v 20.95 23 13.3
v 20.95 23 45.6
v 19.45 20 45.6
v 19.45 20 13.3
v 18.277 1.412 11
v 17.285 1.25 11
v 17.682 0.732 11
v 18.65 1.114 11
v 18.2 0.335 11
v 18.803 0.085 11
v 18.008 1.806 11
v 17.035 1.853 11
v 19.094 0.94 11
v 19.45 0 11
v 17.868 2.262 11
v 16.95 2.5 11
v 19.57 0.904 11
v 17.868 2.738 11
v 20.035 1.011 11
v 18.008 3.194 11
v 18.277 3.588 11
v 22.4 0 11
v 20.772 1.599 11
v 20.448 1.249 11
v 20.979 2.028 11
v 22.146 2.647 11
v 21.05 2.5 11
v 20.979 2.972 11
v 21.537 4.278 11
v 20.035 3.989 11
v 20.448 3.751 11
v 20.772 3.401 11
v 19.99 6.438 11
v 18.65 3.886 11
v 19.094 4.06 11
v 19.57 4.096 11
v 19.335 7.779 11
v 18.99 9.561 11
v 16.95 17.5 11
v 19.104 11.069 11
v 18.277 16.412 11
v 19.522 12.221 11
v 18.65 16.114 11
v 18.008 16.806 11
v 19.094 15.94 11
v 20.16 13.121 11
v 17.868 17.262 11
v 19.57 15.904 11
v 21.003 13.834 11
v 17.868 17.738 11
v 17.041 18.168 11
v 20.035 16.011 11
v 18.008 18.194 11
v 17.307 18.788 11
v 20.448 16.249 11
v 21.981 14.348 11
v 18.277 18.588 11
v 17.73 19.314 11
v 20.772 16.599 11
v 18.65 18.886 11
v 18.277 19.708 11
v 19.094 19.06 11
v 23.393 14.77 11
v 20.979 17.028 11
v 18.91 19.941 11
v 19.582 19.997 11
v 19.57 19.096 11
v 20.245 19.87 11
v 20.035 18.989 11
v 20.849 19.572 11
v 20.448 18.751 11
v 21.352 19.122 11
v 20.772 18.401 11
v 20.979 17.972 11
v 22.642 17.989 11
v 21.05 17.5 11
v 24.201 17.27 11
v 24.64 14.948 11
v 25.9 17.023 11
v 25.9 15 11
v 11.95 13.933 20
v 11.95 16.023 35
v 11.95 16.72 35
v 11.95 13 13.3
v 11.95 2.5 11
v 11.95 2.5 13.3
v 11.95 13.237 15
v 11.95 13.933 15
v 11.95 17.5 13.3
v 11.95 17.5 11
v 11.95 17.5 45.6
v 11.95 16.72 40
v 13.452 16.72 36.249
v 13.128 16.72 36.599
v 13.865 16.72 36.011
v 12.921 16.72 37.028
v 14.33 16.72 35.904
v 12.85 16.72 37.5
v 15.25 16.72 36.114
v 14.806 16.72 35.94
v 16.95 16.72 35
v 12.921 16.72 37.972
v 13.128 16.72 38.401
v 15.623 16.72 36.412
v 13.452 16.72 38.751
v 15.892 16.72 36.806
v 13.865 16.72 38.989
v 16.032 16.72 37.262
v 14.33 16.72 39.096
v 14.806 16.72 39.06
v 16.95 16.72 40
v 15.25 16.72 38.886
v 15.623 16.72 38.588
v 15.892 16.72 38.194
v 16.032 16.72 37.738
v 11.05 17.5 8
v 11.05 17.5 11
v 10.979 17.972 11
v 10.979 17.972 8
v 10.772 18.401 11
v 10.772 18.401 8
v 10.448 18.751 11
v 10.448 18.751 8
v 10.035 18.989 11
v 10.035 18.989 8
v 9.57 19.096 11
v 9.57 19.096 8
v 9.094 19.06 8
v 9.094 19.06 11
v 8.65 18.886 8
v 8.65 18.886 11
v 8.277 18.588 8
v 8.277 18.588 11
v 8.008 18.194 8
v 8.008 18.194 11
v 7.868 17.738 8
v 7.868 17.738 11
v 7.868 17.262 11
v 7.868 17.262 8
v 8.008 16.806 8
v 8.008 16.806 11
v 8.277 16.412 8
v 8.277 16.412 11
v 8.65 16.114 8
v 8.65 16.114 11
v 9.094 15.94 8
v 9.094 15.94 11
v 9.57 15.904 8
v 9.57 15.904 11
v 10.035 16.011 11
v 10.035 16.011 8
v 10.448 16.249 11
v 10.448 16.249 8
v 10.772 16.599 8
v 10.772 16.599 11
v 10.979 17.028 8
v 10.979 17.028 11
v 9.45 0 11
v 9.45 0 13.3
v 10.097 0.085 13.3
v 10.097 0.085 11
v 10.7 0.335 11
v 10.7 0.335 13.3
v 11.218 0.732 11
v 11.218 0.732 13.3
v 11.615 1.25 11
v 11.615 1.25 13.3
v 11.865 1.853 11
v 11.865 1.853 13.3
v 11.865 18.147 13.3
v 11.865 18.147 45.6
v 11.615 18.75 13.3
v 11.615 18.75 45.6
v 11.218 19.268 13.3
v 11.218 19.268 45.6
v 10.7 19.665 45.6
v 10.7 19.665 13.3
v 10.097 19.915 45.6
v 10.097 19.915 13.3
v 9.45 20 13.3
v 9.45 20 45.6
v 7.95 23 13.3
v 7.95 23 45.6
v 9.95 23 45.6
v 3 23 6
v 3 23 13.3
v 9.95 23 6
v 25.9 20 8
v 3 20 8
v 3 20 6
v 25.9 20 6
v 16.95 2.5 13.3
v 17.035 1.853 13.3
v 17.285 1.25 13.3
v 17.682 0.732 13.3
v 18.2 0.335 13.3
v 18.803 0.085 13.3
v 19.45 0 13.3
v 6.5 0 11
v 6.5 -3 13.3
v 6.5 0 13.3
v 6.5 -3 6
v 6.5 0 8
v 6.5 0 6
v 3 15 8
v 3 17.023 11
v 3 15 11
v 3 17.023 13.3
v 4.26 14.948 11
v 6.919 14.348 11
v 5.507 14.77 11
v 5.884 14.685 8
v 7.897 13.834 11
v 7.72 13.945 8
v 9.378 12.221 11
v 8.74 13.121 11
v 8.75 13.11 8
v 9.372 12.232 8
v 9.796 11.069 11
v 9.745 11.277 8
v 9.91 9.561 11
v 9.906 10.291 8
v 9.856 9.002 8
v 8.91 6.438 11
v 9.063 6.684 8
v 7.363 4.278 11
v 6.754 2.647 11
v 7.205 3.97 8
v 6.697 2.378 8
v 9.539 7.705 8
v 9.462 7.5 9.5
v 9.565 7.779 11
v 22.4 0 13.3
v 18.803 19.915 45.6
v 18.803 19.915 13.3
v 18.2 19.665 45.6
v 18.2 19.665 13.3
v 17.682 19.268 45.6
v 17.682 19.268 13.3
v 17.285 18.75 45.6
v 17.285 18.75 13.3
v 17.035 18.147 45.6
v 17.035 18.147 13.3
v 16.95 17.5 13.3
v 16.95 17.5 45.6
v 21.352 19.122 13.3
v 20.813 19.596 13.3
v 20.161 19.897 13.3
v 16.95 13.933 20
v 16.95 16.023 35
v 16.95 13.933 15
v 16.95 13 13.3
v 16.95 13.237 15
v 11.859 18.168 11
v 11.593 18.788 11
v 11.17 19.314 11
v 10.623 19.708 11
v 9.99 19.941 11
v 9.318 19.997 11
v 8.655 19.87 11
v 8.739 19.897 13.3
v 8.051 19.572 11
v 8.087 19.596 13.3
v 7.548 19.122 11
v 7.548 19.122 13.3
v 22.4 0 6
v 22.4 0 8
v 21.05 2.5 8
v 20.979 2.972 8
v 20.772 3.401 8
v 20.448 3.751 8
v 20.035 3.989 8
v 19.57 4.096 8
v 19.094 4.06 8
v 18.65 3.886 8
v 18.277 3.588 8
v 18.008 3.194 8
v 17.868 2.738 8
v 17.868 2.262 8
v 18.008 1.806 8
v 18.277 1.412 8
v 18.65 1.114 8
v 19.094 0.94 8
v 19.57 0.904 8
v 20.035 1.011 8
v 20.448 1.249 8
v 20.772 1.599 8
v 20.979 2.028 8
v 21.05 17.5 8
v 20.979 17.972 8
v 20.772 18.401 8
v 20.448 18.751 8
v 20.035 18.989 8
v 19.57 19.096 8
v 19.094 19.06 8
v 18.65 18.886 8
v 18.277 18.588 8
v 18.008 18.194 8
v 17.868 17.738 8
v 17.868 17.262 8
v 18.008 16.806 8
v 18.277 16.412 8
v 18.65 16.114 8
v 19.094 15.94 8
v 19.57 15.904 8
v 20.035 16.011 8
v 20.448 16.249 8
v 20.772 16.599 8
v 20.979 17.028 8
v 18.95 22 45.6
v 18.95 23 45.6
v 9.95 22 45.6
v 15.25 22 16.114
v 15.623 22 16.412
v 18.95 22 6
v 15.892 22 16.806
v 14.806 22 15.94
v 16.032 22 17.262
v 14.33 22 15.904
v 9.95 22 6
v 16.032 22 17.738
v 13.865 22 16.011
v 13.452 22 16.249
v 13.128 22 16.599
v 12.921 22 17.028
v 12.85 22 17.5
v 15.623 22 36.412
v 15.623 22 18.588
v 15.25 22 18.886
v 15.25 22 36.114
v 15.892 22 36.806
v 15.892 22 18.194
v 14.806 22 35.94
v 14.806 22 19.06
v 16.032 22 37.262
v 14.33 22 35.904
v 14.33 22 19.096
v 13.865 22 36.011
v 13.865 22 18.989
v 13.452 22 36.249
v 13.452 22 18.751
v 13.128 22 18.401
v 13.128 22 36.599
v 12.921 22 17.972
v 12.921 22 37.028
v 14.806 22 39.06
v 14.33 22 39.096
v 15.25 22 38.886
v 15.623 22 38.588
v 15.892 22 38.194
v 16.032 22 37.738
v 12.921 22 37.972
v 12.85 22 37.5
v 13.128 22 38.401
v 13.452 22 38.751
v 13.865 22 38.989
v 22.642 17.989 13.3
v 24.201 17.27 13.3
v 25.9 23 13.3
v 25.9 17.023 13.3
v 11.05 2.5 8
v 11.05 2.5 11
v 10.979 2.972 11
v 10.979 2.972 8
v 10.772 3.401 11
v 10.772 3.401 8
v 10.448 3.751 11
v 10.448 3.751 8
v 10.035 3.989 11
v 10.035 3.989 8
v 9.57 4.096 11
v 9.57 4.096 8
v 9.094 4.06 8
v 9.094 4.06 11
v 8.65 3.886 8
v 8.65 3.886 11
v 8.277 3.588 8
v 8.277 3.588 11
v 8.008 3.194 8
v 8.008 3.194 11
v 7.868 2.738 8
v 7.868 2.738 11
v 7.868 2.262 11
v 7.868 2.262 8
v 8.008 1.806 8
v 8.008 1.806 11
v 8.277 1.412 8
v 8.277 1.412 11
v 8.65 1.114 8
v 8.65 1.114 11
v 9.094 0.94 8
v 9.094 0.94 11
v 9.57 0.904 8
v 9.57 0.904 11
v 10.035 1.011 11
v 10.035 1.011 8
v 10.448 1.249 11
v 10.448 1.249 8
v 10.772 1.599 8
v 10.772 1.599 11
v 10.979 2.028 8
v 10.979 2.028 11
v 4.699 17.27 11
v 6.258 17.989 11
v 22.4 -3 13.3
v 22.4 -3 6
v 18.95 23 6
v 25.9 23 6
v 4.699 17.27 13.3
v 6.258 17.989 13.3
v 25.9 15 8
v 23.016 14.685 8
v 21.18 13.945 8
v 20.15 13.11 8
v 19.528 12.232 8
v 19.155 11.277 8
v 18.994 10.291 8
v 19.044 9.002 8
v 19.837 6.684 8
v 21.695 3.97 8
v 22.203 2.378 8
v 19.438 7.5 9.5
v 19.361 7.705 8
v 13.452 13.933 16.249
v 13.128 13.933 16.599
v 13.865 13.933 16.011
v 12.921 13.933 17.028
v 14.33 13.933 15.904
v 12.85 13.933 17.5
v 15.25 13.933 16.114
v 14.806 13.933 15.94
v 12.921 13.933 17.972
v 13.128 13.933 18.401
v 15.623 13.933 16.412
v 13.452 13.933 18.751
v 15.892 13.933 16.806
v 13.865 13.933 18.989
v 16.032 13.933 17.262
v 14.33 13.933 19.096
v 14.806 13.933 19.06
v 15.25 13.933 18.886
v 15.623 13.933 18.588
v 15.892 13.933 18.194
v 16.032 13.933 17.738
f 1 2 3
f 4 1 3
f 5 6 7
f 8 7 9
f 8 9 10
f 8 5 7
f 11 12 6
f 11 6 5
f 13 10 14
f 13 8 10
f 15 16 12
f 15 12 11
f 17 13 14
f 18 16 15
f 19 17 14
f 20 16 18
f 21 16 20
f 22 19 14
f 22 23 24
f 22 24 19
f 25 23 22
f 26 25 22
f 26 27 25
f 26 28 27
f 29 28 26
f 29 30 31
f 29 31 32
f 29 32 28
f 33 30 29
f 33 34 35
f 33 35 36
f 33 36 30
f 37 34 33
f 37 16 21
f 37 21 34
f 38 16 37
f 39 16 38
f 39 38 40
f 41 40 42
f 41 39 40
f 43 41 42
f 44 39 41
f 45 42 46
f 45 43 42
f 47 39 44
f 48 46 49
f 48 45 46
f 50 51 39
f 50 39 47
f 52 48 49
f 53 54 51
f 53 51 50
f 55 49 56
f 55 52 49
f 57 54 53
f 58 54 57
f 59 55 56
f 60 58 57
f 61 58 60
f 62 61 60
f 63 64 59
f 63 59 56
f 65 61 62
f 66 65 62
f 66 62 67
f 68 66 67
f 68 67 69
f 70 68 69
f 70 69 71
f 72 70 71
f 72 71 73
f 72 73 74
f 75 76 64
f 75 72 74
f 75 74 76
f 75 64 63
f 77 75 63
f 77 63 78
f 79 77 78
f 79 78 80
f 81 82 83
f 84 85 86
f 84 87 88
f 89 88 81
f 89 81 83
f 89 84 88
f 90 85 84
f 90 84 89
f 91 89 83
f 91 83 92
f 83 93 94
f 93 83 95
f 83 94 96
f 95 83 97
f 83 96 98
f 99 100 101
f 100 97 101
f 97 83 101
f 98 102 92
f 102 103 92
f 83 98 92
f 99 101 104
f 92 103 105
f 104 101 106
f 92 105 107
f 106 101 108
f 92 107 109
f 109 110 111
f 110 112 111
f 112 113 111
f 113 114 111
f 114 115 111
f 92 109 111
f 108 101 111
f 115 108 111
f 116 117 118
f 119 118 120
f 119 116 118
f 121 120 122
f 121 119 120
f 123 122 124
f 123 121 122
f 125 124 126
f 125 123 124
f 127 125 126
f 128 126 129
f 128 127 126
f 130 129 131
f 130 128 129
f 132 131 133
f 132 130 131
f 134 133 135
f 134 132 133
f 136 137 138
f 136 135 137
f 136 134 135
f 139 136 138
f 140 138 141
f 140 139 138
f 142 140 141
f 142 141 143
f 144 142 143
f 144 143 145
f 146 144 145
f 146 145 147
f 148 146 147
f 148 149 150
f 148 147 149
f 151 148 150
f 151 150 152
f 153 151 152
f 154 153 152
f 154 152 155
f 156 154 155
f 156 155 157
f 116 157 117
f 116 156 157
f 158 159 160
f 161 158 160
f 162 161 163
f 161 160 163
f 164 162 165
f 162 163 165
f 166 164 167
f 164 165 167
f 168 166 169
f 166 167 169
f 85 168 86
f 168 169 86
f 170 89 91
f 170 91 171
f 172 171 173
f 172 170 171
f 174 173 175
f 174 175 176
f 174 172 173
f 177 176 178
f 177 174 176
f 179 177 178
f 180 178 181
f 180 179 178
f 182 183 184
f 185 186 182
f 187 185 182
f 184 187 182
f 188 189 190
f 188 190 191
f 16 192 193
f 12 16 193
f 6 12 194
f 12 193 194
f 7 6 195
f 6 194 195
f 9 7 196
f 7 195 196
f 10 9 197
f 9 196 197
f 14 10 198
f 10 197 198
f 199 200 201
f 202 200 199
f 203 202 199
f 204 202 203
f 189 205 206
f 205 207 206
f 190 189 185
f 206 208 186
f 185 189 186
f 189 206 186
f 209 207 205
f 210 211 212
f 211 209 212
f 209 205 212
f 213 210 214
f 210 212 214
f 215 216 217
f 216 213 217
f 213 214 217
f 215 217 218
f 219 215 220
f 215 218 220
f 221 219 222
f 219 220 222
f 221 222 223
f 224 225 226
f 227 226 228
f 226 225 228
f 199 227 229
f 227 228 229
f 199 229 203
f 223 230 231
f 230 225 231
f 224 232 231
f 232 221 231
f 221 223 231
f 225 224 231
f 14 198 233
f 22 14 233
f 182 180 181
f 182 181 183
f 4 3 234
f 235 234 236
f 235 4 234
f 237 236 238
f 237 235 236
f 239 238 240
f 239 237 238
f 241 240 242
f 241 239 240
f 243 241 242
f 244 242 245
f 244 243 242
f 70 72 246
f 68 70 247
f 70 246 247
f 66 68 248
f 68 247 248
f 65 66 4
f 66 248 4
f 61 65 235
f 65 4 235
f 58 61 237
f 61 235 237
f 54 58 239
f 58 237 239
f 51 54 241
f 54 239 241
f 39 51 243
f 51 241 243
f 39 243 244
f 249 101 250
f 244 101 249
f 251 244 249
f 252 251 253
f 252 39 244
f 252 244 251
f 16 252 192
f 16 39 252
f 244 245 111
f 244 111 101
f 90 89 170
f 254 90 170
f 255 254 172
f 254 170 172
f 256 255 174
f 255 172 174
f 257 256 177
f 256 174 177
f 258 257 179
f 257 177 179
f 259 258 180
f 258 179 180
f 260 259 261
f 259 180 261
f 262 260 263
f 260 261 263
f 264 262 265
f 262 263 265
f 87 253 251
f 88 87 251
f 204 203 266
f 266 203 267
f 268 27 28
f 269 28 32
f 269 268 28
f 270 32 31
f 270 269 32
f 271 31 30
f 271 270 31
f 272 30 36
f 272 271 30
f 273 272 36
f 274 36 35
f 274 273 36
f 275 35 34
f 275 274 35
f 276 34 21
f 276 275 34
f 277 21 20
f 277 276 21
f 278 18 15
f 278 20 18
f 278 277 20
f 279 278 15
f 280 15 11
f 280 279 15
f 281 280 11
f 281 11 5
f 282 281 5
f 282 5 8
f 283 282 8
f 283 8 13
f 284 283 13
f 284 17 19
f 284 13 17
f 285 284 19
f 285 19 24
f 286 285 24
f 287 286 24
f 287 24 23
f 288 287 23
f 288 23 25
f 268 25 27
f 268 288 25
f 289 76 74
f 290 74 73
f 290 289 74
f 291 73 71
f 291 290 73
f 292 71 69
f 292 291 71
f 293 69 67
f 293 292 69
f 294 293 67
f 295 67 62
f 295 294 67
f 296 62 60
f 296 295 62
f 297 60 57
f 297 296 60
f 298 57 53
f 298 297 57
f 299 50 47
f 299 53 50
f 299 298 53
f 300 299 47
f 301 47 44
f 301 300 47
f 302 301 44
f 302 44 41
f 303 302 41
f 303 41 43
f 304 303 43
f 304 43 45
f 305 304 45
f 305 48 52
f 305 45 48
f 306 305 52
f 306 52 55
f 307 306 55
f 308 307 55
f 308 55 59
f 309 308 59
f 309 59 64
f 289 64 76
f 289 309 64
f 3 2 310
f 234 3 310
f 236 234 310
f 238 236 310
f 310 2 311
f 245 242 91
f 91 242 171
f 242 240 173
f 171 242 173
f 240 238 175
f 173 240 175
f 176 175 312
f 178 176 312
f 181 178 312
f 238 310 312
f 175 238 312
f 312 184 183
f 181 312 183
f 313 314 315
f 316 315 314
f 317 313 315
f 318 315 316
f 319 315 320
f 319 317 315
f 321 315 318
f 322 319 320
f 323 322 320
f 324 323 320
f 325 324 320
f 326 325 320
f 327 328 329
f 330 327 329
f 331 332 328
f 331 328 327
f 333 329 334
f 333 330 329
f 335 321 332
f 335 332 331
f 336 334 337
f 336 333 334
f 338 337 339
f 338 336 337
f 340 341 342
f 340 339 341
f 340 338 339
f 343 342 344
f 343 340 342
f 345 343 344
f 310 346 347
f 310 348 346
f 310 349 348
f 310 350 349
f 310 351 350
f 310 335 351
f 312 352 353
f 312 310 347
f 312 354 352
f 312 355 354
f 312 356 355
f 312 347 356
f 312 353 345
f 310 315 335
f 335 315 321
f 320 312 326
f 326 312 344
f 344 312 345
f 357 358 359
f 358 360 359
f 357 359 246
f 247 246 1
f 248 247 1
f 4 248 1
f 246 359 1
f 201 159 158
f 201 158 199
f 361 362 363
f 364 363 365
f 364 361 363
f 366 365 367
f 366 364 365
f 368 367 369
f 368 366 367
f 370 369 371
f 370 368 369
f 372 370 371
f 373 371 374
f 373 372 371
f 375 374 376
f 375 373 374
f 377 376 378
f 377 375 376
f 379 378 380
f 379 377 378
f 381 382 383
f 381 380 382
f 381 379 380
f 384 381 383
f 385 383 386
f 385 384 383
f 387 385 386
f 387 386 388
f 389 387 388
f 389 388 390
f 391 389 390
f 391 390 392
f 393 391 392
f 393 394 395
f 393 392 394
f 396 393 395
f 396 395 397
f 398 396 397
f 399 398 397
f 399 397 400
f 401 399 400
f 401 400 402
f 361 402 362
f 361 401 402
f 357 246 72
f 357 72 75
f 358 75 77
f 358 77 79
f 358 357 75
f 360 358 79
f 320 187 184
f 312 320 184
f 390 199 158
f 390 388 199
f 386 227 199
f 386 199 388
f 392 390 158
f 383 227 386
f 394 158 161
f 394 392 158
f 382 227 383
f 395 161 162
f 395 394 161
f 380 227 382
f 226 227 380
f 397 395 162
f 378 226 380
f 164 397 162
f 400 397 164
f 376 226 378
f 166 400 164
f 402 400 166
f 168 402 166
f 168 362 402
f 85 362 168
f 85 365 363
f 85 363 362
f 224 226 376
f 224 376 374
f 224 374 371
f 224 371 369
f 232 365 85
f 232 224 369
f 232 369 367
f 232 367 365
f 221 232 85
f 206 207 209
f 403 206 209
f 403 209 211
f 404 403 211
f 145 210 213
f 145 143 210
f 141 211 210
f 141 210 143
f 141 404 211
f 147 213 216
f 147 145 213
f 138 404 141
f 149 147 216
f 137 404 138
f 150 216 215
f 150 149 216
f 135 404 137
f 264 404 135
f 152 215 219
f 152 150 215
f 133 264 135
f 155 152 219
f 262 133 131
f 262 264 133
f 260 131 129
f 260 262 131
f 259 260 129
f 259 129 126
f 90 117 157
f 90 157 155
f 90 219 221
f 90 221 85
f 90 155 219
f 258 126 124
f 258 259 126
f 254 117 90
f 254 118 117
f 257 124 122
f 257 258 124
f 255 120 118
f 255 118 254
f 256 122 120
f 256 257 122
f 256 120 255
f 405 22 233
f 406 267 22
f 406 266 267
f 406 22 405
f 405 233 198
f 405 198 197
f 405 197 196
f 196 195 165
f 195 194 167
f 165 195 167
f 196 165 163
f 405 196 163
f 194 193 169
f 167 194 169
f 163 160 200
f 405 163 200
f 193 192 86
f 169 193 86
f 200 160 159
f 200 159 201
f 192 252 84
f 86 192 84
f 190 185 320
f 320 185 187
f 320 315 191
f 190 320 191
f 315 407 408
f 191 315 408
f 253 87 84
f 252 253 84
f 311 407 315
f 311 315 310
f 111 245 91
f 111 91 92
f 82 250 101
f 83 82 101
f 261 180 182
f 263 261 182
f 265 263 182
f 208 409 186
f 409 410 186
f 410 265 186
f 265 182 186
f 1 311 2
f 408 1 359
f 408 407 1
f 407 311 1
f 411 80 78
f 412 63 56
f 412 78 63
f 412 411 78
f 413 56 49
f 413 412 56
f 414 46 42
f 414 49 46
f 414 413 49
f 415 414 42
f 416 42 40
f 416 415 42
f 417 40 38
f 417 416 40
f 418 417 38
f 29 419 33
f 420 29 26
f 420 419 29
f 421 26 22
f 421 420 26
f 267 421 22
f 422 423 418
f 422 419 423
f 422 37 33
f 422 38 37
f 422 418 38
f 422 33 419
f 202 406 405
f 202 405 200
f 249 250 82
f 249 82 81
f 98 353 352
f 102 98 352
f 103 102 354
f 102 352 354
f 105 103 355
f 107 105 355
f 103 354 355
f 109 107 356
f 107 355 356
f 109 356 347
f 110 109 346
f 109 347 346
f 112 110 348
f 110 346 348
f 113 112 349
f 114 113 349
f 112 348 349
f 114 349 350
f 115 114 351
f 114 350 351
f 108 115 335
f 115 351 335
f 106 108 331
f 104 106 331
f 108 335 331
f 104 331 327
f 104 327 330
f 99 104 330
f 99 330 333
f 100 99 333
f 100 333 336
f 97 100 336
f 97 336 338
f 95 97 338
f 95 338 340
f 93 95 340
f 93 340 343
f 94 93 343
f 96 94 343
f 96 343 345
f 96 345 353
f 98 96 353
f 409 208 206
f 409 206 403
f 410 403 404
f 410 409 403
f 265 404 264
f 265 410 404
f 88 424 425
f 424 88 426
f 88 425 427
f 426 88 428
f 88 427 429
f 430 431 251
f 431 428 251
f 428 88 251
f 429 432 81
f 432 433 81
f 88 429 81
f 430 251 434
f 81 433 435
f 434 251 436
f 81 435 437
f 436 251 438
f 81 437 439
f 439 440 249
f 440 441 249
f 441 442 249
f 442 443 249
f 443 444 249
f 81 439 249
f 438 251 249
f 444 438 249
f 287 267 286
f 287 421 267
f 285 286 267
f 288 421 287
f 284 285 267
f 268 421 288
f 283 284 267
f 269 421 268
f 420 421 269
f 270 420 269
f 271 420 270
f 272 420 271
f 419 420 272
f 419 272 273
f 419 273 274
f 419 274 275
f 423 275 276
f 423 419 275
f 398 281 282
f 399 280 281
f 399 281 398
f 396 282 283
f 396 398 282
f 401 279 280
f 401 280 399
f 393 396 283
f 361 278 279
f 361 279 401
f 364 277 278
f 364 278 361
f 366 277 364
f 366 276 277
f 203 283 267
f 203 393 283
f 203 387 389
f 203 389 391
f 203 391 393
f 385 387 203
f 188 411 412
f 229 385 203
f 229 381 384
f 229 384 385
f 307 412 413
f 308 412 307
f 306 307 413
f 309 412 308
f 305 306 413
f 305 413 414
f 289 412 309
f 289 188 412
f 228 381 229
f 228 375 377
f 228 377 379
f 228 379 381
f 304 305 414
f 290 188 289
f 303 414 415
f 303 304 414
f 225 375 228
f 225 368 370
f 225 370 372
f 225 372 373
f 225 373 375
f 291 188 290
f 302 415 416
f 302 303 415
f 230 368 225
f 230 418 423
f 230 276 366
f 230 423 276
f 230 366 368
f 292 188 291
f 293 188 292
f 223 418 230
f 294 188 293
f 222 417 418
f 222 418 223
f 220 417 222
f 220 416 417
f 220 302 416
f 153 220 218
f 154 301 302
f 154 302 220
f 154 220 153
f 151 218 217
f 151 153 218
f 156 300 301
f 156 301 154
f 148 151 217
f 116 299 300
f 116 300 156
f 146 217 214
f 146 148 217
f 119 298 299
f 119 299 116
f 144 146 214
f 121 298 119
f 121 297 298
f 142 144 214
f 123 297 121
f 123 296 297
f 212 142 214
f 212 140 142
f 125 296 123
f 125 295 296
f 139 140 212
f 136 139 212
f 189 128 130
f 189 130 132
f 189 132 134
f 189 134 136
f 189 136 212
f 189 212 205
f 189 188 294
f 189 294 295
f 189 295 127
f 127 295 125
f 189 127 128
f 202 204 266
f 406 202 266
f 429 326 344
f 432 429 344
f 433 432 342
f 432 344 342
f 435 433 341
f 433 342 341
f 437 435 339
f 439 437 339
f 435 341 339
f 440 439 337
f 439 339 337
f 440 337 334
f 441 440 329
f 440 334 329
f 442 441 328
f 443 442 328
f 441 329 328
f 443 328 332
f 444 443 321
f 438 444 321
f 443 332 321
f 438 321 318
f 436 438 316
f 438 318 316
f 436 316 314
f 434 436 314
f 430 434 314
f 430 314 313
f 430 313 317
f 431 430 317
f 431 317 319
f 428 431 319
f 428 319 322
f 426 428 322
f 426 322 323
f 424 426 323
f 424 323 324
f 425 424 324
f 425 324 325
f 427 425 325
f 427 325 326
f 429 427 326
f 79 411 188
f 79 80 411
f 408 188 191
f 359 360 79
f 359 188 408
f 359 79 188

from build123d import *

# Parameters (mm, degrees)
SKETCH_R        = 1.6
PAD_DEPTH       = 5.3
SKETCH001_W     = 22.9
SKETCH001_H     = 3
SKETCH001_W_2   = 15.9
PAD001_DEPTH    = 2
POCKET_DEPTH    = 2.3
PAD002_DEPTH    = 32.3
POCKET001_DEPTH = 10
SKETCH007_W     = 9
SKETCH007_H     = 39.6
POCKET002_DEPTH = 1
SKETCH008_R     = 1.6
POCKET003_DEPTH = 10
SKETCH009_W     = 0.696594
SKETCH009_H     = 5
SKETCH009_W_2   = 0.696595
POCKET004_DEPTH = 5


with BuildPart() as part:
    # Sketch (on Face1 of ReferenceBinder) → Pad (new body)
    with BuildSketch(Plane.XY.offset(8)):
        with BuildLine():
            Line((3, 23), (25.9, 23))
            Line((25.9, 23), (25.9, 15))
            add(Edge.make_bspline(
                [(25.9, 15), (18.45, 15), (18.45, 5), (22.4, 5), (22.4, 0)],
                knots=[0, 0, 0, 0, 0.5, 1, 1, 1, 1], degree=3))
            Line((22.4, 0), (22.4, -3))
            Line((22.4, -3), (6.5, -3))
            Line((6.5, -3), (6.5, 0))
            add(Edge.make_bspline(
                [(3, 15), (10.45, 15), (10.45, 5), (6.5, 5), (6.5, 0)],
                knots=[0, 0, 0, 0, 0.5, 1, 1, 1, 1], degree=3))
            Line((3, 15), (3, 23))
        make_face()
        with Locations((9.45, 17.5)):
            Circle(SKETCH_R, mode=Mode.SUBTRACT)
        with Locations((19.45, 17.5)):
            Circle(SKETCH_R, mode=Mode.SUBTRACT)
        with Locations((19.45, 2.5)):
            Circle(SKETCH_R, mode=Mode.SUBTRACT)
        with Locations((9.45, 2.5)):
            Circle(SKETCH_R, mode=Mode.SUBTRACT)
    extrude(amount=PAD_DEPTH)

    # Sketch001 (on Face1 of ReferenceBinder) → Pad001 (join)
    with BuildSketch(Plane.XY.offset(8)):
        with Locations((14.45, 21.5)):
            Rectangle(SKETCH001_W, SKETCH001_H)
        with Locations((14.45, -1.5)):
            Rectangle(SKETCH001_W_2, SKETCH001_H)
    extrude(amount=-PAD001_DEPTH)

    # Sketch002 (on Face5 of Pad001) → Pocket (cut)
    with BuildSketch(Plane.XY.offset(13.3)):
        with BuildLine():
            ThreePointArc((9.449999, 0), (11.217763, 0.732229), (11.95, 2.499988))
            Line((11.95, 17.5), (11.95, 2.499988))
            ThreePointArc((11.95, 17.5), (10.314365, 19.84582), (7.547701, 19.122116))
            ThreePointArc((3, 17.023415), (5.504303, 17.573395), (7.547701, 19.122116))
            Line((3, 17.023415), (3, 15))
            Line((3, 15), (6.5, 0))
            Line((9.449999, 0), (6.5, 0))
        make_face()
        with BuildLine():
            ThreePointArc((16.95, 2.499988), (17.682233, 0.732233), (19.449988, 0))
            Line((19.449988, 0), (22.4, 0))
            Line((22.4, 0), (25.9, 15))
            Line((25.9, 15), (25.9, 17.023415))
            ThreePointArc((21.352299, 19.122116), (23.395697, 17.573395), (25.9, 17.023415))
            ThreePointArc((21.352299, 19.122116), (18.585635, 19.84582), (16.95, 17.5))
            Line((16.95, 17.5), (16.95, 2.499988))
        make_face()
    extrude(amount=-POCKET_DEPTH, mode=Mode.SUBTRACT)

    # Sketch005 (on Face5 of Pocket) → Pad002 (join)
    with BuildSketch(Plane.XY.offset(13.3)):
        with BuildLine():
            Line((7.95, 23), (20.95, 23))
            Line((20.95, 23), (19.45, 20))
            ThreePointArc((19.45, 20), (17.682233, 19.267767), (16.95, 17.5))
            Line((16.95, 17.5), (16.95, 13))
            Line((16.95, 13), (11.95, 13))
            Line((11.95, 13), (11.95, 17.5))
            ThreePointArc((11.95, 17.5), (11.217767, 19.267767), (9.45, 20))
            Line((9.45, 20), (7.95, 23))
        make_face()
    extrude(amount=PAD002_DEPTH)

    # Sketch006 (on Face39 of Pad002) → Pocket001 (cut)
    with BuildSketch(Plane.YZ.offset(16.95)):
        Polygon((17.5, 45.6), (13, 13.3), (13, 45.6), align=None)
    extrude(amount=-POCKET001_DEPTH, mode=Mode.SUBTRACT)

    # Sketch007 (on Face6 of Pocket001) → Pocket002 (cut)
    with BuildSketch(Plane(origin=(0, 23, 0), x_dir=(-1, 0, 0), z_dir=(0, 1, 0))):
        with Locations((-14.45, 25.8)):
            Rectangle(SKETCH007_W, SKETCH007_H)
    extrude(amount=-POCKET002_DEPTH, mode=Mode.SUBTRACT)

    # Sketch008 (on Face10 of Pocket002) → Pocket003 (cut)
    with BuildSketch(Plane(origin=(0, 22, 0), x_dir=(-1, 0, 0), z_dir=(0, 1, 0))):
        with Locations((-14.45, 37.5)):
            Circle(SKETCH008_R)
        with Locations((-14.45, 17.5)):
            Circle(SKETCH008_R)
    extrude(amount=-POCKET003_DEPTH, mode=Mode.SUBTRACT)

    # Sketch009 (on Face41 of Pocket003) → Pocket004 (cut)
    with BuildSketch(Plane.YZ.offset(16.95)):
        with Locations((16.371517, 37.5)):
            Rectangle(SKETCH009_W, SKETCH009_H)
        with Locations((13.58514, 17.5)):
            Rectangle(SKETCH009_W_2, SKETCH009_H)
    extrude(amount=-POCKET004_DEPTH, mode=Mode.SUBTRACT)


solid = part.part
